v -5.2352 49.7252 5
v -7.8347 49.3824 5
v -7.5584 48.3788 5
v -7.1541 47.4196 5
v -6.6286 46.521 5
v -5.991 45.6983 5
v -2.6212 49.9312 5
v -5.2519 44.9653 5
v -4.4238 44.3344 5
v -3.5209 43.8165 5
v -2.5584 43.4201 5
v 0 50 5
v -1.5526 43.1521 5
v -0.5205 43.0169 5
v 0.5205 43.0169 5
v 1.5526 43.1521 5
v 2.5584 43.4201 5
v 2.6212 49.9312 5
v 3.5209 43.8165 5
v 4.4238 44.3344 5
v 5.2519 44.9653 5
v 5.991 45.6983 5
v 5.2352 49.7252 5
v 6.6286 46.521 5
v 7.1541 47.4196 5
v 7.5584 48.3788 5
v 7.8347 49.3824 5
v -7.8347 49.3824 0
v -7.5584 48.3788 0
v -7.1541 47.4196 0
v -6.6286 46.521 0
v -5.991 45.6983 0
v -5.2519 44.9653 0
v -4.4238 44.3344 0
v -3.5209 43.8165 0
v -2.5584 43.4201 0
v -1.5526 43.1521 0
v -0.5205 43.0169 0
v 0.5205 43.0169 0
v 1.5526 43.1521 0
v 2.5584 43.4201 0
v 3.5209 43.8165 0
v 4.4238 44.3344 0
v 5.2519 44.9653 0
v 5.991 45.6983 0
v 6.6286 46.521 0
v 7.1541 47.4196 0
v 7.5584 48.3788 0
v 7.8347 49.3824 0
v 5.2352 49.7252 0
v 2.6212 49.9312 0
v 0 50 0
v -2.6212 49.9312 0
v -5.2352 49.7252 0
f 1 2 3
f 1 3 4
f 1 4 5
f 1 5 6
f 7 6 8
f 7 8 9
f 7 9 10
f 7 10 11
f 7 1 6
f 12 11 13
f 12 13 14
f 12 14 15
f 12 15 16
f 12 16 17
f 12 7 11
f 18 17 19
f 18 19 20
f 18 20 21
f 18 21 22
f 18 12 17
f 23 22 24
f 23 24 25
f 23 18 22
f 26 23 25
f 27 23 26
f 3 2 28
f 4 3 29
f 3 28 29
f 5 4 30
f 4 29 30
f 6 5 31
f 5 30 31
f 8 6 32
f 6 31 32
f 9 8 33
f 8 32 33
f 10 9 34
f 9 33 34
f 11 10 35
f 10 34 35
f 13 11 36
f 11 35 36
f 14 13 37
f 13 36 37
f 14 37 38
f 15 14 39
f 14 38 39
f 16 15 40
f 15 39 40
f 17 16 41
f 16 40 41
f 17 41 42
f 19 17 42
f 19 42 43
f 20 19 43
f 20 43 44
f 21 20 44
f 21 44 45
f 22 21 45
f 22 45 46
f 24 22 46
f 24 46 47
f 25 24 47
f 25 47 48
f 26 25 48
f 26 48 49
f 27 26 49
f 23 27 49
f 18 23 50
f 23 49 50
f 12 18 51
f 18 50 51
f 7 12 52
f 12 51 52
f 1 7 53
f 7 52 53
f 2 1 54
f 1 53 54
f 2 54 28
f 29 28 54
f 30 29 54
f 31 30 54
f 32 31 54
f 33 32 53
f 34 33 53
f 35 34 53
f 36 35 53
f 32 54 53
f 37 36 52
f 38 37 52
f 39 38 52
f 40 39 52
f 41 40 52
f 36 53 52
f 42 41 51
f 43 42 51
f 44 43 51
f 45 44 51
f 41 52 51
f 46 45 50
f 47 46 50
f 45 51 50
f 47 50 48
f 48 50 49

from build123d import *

# Parameters (mm, degrees)
CYLINDER018_R     = 50
CYLINDER018_DEPTH = 10
CYLINDER017_R     = 8
CYLINDER017_DEPTH = 5


with BuildPart() as cylinder019:
    # Cylinder018 → Cylinder018 (new body)
    with BuildSketch(Plane.XY):
        Circle(CYLINDER018_R)
    extrude(amount=CYLINDER018_DEPTH)


with BuildPart() as common:
    # Cylinder017 → Cylinder017 (new body)
    with BuildSketch(Plane(origin=(0, 51, 0), x_dir=(1, 0, 0), z_dir=(0, 0, 1))):
        Circle(CYLINDER017_R)
    extrude(amount=CYLINDER017_DEPTH)

    # Common: intersect Cylinder019
    add(cylinder019.part, mode=Mode.INTERSECT)


solid = common.part
